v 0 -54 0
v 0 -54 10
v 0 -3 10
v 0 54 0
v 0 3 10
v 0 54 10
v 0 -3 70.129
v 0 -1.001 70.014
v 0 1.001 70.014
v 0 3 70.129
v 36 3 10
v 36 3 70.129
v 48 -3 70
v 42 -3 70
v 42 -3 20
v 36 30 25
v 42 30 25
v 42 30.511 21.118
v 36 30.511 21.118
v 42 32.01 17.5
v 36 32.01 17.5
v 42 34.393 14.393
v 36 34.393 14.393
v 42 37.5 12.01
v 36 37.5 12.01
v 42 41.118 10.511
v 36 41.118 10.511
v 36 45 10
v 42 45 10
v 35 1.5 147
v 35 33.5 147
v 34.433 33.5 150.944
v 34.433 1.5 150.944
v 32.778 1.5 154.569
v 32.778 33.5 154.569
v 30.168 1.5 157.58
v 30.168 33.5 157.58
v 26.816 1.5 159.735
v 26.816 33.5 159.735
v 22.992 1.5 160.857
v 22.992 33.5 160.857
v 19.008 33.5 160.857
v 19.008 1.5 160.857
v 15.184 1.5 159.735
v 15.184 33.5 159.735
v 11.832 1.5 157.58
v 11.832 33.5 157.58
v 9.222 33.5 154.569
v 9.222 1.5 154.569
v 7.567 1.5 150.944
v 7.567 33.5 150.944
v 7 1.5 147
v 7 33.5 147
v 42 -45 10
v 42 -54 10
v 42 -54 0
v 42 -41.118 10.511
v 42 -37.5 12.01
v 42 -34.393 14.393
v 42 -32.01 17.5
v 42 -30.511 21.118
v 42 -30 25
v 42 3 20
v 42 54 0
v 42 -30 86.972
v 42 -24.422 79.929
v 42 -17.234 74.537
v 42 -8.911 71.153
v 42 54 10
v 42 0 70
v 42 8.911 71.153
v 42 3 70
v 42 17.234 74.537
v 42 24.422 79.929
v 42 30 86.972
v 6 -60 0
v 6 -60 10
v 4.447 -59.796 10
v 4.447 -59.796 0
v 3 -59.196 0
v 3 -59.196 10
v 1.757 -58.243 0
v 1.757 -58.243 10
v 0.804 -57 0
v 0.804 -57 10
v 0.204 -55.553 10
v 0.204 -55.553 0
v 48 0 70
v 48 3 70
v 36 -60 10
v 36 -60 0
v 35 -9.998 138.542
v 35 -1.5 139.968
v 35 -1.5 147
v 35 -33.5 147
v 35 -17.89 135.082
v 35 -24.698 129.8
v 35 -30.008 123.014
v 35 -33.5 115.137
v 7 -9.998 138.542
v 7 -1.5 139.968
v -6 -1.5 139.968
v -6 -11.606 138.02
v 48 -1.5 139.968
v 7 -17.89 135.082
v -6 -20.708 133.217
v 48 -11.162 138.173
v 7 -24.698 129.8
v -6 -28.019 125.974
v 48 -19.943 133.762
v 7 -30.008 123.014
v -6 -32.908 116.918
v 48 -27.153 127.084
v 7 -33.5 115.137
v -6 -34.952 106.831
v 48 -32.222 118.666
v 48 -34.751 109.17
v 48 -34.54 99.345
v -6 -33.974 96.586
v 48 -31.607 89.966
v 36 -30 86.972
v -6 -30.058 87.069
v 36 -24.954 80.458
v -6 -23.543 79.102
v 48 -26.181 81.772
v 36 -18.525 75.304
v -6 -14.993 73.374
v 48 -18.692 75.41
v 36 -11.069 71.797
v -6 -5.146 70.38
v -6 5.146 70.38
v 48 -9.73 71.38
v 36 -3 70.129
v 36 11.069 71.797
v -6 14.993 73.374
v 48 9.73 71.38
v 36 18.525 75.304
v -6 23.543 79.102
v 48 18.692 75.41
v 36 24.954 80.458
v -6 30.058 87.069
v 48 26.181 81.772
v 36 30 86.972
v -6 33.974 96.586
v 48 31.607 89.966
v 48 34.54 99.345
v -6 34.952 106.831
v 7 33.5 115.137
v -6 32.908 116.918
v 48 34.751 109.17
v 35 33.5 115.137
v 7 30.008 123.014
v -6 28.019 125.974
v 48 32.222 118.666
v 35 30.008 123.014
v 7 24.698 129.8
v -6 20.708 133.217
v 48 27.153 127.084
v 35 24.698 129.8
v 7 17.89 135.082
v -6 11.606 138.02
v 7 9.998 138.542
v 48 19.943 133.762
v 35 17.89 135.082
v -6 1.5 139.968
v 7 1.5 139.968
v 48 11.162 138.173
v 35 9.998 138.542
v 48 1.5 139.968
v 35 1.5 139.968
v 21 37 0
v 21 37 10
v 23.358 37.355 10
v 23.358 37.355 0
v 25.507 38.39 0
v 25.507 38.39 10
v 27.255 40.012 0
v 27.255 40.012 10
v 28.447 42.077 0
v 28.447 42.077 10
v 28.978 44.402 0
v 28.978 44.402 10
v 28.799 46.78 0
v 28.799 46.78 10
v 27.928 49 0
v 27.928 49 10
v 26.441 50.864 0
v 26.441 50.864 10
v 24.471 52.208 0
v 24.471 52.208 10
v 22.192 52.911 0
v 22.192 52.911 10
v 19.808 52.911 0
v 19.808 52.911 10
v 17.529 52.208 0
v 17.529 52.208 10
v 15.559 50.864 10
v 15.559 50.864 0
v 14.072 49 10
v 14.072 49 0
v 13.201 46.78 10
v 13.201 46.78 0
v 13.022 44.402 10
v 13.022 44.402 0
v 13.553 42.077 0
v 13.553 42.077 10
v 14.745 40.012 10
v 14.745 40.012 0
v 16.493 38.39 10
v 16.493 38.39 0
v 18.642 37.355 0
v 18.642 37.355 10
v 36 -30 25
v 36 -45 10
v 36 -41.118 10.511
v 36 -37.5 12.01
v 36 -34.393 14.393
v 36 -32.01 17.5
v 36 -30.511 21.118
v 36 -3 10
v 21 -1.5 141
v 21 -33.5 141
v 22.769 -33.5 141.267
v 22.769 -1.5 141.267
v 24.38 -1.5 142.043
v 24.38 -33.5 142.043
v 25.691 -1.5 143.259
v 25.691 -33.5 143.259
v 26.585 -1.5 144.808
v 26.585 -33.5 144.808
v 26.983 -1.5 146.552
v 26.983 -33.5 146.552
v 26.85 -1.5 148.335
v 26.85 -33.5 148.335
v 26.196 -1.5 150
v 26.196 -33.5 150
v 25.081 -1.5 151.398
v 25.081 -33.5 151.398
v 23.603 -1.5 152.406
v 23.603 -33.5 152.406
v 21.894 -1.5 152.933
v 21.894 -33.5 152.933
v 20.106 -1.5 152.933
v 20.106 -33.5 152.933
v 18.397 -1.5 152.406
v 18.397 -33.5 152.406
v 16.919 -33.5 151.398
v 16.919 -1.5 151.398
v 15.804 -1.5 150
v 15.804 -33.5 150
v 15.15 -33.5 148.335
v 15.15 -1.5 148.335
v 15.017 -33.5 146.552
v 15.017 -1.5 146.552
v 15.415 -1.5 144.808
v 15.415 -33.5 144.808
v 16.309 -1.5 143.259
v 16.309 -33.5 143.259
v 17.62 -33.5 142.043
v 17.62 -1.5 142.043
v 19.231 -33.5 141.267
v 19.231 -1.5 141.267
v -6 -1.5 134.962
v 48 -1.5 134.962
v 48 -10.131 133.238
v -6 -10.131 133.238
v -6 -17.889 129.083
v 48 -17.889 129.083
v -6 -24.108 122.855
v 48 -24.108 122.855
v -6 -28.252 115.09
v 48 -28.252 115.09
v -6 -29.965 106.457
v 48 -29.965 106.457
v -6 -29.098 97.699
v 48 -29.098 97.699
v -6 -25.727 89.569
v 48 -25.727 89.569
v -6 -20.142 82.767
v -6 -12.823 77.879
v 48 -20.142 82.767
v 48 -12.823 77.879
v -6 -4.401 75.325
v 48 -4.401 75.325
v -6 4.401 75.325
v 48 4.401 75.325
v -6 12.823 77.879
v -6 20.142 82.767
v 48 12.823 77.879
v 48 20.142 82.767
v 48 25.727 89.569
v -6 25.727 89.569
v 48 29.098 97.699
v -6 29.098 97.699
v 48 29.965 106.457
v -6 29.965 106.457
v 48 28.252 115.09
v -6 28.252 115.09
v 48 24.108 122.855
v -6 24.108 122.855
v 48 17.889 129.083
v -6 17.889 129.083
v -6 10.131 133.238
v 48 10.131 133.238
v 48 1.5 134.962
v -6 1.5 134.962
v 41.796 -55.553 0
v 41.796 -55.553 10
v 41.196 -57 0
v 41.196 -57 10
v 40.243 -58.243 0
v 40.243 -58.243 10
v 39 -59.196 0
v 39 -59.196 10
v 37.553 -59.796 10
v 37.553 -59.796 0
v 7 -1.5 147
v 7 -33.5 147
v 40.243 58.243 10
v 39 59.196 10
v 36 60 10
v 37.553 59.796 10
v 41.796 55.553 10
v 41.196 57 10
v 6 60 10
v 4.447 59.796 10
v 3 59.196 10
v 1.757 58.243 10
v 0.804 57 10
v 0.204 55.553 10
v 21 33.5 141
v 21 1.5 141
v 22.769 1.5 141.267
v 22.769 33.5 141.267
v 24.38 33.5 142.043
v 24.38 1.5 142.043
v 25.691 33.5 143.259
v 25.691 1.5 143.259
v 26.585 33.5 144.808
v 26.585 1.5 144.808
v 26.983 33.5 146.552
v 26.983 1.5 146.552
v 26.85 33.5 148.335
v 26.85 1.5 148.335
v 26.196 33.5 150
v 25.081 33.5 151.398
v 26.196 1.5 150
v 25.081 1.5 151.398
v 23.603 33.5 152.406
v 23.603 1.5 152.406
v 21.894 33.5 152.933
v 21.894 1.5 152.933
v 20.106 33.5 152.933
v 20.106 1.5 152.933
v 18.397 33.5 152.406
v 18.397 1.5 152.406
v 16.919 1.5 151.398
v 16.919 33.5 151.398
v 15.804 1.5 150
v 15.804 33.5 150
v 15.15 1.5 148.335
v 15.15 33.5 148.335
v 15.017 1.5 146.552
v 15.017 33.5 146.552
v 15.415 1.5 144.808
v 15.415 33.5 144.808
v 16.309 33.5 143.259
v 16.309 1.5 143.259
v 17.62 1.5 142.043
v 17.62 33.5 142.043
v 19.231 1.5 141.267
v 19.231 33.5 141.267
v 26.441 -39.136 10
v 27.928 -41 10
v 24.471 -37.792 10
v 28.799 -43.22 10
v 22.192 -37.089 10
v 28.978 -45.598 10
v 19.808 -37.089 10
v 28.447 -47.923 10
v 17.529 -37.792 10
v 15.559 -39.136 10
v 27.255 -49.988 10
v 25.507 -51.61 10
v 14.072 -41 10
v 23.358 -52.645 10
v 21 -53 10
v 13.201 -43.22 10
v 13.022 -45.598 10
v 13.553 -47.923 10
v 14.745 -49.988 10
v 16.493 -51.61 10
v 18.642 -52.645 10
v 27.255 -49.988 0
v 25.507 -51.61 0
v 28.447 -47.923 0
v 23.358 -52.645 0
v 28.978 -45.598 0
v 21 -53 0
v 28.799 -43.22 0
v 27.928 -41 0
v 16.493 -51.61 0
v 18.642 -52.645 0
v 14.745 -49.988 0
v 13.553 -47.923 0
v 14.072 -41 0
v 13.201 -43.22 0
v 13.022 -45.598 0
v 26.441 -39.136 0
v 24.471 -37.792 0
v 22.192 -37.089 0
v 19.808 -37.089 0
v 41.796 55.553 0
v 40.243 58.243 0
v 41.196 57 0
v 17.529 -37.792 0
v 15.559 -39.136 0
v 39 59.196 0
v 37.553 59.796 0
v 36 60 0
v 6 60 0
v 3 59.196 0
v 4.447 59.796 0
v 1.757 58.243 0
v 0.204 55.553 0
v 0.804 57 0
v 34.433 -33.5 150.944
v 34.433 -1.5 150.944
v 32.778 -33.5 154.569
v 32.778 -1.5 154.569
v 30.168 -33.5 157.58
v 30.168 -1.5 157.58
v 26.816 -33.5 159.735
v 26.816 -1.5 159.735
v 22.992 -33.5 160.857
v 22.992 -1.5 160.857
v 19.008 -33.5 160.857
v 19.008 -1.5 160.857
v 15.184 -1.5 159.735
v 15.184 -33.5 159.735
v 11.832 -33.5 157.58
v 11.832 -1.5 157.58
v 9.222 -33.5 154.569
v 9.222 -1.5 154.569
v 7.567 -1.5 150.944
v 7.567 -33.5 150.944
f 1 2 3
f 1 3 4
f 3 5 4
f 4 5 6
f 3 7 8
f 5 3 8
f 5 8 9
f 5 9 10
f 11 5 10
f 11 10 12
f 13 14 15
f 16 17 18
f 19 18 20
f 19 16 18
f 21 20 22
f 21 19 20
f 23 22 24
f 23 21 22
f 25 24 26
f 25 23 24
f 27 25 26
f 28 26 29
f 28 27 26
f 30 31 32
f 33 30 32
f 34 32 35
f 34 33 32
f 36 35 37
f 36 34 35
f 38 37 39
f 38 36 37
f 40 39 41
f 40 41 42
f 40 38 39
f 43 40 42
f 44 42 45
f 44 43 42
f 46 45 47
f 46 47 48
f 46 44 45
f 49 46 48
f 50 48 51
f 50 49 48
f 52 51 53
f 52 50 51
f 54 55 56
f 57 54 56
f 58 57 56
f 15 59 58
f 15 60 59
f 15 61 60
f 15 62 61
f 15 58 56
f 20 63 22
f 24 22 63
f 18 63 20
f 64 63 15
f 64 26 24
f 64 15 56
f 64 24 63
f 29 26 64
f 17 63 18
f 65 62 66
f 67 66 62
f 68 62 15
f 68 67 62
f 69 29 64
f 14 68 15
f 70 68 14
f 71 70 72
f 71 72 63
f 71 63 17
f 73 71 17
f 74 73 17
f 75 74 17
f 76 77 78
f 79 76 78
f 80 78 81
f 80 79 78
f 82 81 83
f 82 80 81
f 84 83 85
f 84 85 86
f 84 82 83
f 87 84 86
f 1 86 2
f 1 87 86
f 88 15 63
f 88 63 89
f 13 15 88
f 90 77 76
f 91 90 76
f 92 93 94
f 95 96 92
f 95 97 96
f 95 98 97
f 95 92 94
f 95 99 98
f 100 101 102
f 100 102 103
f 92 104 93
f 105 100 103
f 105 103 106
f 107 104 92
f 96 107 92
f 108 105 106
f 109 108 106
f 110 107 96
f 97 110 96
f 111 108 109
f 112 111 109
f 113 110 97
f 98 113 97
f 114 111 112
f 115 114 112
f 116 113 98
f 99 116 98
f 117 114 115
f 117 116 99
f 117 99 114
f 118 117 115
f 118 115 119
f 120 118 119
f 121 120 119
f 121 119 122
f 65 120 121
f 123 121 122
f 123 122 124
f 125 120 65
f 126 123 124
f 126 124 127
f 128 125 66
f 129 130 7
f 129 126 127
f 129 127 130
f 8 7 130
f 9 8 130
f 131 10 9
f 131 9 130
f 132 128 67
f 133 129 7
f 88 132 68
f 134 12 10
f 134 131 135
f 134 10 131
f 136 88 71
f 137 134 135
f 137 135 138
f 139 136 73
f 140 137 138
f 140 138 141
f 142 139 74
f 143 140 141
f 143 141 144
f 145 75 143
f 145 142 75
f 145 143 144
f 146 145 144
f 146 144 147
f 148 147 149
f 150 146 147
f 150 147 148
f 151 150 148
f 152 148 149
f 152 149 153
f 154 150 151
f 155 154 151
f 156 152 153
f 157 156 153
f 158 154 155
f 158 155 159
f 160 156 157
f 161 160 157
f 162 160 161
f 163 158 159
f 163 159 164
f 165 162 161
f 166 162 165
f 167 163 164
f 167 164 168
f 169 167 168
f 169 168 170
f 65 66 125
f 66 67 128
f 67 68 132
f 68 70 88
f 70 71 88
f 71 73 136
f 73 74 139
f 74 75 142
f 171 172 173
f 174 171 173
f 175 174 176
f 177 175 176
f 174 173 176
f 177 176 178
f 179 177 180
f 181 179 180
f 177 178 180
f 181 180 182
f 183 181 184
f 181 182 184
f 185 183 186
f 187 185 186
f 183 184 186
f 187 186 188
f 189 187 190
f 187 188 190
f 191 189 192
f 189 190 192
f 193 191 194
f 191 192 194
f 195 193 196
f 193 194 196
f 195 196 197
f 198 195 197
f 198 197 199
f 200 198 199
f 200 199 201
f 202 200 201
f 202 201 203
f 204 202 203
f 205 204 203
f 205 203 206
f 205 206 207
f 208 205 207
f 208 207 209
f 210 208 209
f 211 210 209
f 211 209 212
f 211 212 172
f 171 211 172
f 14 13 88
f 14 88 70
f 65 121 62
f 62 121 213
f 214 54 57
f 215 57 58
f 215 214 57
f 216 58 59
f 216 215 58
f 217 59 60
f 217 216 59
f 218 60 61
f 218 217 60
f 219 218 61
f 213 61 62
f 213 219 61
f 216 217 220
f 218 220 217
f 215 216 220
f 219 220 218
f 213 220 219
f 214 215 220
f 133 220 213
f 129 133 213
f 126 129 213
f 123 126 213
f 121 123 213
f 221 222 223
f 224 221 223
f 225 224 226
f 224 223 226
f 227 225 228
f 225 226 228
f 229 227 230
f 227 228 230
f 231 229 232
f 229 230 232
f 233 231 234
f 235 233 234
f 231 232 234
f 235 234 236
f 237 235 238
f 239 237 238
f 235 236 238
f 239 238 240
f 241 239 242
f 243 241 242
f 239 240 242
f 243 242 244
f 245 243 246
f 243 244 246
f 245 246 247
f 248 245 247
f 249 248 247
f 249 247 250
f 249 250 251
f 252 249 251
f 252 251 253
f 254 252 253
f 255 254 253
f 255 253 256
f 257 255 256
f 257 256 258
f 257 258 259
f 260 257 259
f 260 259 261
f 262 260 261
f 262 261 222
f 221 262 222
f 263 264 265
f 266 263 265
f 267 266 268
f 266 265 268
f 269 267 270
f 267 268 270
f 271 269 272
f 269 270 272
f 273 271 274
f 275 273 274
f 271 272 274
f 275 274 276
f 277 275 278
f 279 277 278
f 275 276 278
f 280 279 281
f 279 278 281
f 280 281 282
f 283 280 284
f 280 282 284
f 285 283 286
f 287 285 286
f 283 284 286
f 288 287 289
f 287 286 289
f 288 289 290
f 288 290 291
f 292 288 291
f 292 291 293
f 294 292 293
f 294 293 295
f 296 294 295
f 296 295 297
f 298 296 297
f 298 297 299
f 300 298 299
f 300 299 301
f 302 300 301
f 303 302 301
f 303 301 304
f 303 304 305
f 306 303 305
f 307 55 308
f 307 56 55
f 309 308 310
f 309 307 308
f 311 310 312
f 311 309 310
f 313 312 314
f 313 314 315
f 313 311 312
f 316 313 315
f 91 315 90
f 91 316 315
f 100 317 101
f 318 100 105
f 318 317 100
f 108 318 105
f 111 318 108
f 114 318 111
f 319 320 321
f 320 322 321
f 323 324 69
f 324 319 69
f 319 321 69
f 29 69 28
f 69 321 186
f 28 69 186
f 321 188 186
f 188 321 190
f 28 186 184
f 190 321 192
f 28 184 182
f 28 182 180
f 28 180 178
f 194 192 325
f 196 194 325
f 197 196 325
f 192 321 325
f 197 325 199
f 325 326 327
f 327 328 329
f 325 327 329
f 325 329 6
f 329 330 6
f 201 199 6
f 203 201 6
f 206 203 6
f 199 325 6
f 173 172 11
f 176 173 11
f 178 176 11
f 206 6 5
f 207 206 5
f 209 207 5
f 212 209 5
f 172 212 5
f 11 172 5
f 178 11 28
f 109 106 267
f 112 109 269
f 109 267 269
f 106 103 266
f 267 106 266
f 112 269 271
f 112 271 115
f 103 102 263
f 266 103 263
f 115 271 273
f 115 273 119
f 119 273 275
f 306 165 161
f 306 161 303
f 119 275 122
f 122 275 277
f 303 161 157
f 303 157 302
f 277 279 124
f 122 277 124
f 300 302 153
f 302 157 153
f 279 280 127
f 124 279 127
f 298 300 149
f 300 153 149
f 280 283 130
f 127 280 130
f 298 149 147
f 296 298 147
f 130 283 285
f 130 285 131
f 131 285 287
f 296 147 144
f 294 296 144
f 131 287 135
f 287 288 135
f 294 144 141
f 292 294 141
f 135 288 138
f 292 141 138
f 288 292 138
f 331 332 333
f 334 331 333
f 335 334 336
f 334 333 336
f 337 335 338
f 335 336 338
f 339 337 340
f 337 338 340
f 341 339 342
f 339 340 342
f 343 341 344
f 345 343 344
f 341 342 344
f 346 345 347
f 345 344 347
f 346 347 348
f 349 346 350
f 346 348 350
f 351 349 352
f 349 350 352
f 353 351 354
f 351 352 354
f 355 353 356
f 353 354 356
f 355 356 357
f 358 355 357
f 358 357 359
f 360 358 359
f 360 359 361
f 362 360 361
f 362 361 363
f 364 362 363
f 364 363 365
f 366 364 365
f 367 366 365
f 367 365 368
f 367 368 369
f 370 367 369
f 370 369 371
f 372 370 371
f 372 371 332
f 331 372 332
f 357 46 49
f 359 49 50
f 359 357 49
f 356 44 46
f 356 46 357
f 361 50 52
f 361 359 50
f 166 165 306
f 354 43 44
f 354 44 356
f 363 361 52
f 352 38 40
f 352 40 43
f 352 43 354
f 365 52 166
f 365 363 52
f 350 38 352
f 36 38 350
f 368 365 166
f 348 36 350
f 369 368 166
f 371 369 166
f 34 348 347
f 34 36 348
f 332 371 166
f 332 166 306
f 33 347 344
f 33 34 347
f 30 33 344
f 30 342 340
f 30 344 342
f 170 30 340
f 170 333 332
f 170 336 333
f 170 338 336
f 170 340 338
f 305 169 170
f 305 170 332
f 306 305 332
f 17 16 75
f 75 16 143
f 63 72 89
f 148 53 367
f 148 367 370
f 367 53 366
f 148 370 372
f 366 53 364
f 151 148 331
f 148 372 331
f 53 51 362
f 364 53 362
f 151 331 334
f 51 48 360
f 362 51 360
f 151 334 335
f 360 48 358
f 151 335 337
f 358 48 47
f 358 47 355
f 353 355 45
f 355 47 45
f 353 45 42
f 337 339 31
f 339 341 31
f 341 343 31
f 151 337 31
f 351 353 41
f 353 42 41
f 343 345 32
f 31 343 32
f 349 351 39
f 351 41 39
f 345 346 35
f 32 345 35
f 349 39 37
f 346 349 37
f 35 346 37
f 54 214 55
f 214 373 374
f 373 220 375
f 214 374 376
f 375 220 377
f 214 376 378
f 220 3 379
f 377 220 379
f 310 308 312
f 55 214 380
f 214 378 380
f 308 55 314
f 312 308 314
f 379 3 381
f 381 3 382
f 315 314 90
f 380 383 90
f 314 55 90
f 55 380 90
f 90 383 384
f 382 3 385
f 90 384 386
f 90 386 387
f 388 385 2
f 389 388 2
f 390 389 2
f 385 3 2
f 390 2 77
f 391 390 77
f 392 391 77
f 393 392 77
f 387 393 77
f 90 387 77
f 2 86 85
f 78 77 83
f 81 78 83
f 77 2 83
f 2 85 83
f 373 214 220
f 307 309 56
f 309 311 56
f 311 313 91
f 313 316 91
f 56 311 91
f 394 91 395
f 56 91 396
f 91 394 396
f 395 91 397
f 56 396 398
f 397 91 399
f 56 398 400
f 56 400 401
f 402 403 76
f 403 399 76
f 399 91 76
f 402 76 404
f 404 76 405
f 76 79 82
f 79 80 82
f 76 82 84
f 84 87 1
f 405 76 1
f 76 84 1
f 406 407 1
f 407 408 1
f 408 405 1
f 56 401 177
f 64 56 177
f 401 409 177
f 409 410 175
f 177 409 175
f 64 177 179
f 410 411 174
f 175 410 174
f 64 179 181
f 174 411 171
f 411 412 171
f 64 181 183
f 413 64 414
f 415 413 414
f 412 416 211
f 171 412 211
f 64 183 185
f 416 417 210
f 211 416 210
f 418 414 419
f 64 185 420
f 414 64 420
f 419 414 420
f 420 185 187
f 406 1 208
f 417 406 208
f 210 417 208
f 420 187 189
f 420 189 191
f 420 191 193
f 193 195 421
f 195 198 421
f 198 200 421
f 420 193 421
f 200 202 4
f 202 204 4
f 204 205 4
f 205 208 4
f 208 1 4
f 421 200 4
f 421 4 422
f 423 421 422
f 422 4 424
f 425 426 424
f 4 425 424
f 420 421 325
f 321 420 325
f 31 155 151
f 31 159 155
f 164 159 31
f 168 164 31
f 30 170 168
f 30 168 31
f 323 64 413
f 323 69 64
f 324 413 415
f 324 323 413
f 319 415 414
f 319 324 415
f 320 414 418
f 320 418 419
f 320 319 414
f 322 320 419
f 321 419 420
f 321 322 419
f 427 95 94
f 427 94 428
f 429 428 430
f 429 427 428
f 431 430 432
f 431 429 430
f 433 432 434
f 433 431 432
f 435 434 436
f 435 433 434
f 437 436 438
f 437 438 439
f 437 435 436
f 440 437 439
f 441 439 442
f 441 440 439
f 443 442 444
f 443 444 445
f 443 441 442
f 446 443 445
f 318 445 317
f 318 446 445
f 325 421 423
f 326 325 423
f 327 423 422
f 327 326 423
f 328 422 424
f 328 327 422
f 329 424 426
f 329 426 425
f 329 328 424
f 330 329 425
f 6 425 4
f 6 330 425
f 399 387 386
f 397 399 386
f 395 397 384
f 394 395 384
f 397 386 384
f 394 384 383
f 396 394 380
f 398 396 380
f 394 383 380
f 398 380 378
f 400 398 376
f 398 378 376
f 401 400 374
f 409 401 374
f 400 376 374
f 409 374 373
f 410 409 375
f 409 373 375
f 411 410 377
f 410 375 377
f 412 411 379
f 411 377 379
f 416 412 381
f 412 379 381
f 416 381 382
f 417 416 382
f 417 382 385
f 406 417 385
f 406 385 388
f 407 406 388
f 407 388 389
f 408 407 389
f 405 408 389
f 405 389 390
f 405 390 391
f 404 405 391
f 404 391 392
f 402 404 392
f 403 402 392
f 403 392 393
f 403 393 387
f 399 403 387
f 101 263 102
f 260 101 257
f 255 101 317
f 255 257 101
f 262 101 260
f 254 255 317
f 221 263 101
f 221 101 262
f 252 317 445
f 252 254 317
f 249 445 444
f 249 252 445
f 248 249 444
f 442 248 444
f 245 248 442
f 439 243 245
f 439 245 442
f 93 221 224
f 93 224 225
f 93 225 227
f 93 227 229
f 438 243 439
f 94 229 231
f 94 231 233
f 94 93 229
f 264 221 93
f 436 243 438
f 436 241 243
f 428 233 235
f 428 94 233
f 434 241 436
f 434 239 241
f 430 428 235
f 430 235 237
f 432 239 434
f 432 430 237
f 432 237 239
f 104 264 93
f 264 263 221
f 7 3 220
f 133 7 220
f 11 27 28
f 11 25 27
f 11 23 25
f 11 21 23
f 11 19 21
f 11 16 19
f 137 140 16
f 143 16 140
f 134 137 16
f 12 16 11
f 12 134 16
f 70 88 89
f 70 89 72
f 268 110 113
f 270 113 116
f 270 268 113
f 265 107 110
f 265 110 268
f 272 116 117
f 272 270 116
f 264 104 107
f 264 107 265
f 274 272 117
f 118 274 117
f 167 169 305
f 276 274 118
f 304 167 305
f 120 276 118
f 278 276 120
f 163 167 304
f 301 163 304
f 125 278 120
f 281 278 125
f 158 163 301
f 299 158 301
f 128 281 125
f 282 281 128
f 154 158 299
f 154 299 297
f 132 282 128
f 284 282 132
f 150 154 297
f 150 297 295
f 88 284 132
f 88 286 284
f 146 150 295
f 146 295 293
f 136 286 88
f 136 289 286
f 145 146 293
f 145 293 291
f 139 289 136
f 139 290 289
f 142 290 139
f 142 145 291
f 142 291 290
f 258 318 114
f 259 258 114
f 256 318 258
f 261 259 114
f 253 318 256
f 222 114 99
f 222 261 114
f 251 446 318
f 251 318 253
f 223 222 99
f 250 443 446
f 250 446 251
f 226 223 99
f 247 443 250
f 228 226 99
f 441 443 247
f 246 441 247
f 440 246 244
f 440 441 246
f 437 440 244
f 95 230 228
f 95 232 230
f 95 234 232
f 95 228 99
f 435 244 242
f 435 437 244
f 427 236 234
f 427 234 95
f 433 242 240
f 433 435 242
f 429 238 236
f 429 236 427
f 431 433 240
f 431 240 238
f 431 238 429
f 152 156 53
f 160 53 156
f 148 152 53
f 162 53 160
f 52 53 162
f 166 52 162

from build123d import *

# Parameters (mm, degrees)
PAD_DEPTH       = 42
SKETCH001_W     = 57
SKETCH001_H     = 36
POCKET_DEPTH    = 95
FILLET_R        = 6
FILLET001_R     = 6
FILLET002_R     = 6
FILLET003_R     = 6
SKETCH002_R     = 8
POCKET001_DEPTH = 10.001
POCKET002_DEPTH = 42.001
SKETCH004_R     = 35
PAD001_DEPTH    = 54
PAD002_DEPTH    = 33.5
POCKET003_DEPTH = 54.001
SKETCH008_R     = 6
POCKET004_DEPTH = 93.501
PAD003_DEPTH    = 3


with BuildPart() as part:
    # Sketch → Pad (new body)
    with BuildSketch(Plane.YZ):
        with BuildLine():
            Line((-60, 0), (60, 0))
            Line((60, 0), (60, 10))
            Line((60, 10), (45, 10))
            ThreePointArc((30, 25), (34.393398, 14.393398), (45, 10))
            Line((30, 25), (30, 105))
            Line((30, 105), (-30, 105))
            Line((-30, 105), (-30, 25))
            ThreePointArc((-45, 10), (-34.393398, 14.393398), (-30, 25))
            Line((-45, 10), (-60, 10))
            Line((-60, 10), (-60, 0))
        make_face()
    extrude(amount=PAD_DEPTH)

    # Sketch001 (on Face8 of Pad) → Pocket (cut)
    with BuildSketch(Plane(origin=(0, 0, 105), x_dir=(0, -1, 0), z_dir=(0, 0, 1))):
        with Locations((-31.5, 18)):
            Rectangle(SKETCH001_W, SKETCH001_H)
        with Locations((31.5, 18)):
            Rectangle(SKETCH001_W, SKETCH001_H)
    extrude(amount=-POCKET_DEPTH, mode=Mode.SUBTRACT)

    # Fillet
    fillet_edges = [part.edges().sort_by_distance(p)[0] for p in [
        (42, -60, 5),
    ]]
    fillet(fillet_edges, radius=FILLET_R)

    # Fillet001
    fillet001_edges = [part.edges().sort_by_distance(p)[0] for p in [
        (0, -60, 5),
    ]]
    fillet(fillet001_edges, radius=FILLET001_R)

    # Fillet002
    fillet002_edges = [part.edges().sort_by_distance(p)[0] for p in [
        (42, 60, 5),
    ]]
    fillet(fillet002_edges, radius=FILLET002_R)

    # Fillet003
    fillet003_edges = [part.edges().sort_by_distance(p)[0] for p in [
        (0, 60, 5),
    ]]
    fillet(fillet003_edges, radius=FILLET003_R)

    # Sketch002 (on Face14 of Fillet003) → Pocket001 (cut, through all)
    with BuildSketch(Plane(origin=(0, 0, 10), x_dir=(0, -1, 0), z_dir=(0, 0, 1))):
        with Locations((-45, 21)):
            Circle(SKETCH002_R)
        with Locations((45, 21)):
            Circle(SKETCH002_R)
    extrude(amount=-POCKET001_DEPTH, mode=Mode.SUBTRACT)

    # Sketch003 → Pocket002 (cut, through all)
    with BuildSketch(Plane.YZ):
        with BuildLine():
            ThreePointArc((-35, 105), (0, 70), (35, 105))
            Line((-35, 105), (35, 105))
        make_face()
    extrude(amount=POCKET002_DEPTH, mode=Mode.SUBTRACT)

    # Sketch004 → Pad001 (join)
    with BuildSketch(Plane(origin=(48, 0, 105), x_dir=(0, 0, -1), z_dir=(1, 0, 0))):
        Circle(SKETCH004_R)
    extrude(amount=-PAD001_DEPTH)

    # Sketch006 → Pad002 (join, symmetric)
    with BuildSketch(Plane.XZ):
        with BuildLine():
            Line((7, 146.999962), (7, 104.999962))
            Line((7, 104.999962), (35, 105))
            Line((35, 105), (35, 146.999962))
            ThreePointArc((35, 146.999962), (21, 160.999962), (7, 146.999962))
        make_face()
    extrude(amount=PAD002_DEPTH, both=True)

    # Sketch007 (on Face28 of Pad002) → Pocket003 (cut, through all)
    with BuildSketch(Plane.YZ.offset(48)):
        with BuildLine():
            ThreePointArc((-1.5, 134.962477), (0, 75), (1.5, 134.962477))
            Line((1.5, 163), (1.5, 134.962477))
            Line((-1.5, 163), (1.5, 163))
            Line((-1.5, 134.962477), (-1.5, 163))
        make_face()
    extrude(amount=-POCKET003_DEPTH, mode=Mode.SUBTRACT)

    # Sketch008 (on Face30 of Pocket003) → Pocket004 (cut, through all)
    with BuildSketch(Plane(origin=(0, -33.5, 0), x_dir=(0, 0, -1), z_dir=(0, -1, 0))):
        with Locations((-147, 21)):
            Circle(SKETCH008_R)
    extrude(amount=-POCKET004_DEPTH, mode=Mode.SUBTRACT)

    # Sketch009 → Pad003 (join, symmetric)
    with BuildSketch(Plane.XZ):
        Polygon((42, 70), (42, 20), (48, 70), align=None)
    extrude(amount=PAD003_DEPTH, both=True)


solid = part.part
